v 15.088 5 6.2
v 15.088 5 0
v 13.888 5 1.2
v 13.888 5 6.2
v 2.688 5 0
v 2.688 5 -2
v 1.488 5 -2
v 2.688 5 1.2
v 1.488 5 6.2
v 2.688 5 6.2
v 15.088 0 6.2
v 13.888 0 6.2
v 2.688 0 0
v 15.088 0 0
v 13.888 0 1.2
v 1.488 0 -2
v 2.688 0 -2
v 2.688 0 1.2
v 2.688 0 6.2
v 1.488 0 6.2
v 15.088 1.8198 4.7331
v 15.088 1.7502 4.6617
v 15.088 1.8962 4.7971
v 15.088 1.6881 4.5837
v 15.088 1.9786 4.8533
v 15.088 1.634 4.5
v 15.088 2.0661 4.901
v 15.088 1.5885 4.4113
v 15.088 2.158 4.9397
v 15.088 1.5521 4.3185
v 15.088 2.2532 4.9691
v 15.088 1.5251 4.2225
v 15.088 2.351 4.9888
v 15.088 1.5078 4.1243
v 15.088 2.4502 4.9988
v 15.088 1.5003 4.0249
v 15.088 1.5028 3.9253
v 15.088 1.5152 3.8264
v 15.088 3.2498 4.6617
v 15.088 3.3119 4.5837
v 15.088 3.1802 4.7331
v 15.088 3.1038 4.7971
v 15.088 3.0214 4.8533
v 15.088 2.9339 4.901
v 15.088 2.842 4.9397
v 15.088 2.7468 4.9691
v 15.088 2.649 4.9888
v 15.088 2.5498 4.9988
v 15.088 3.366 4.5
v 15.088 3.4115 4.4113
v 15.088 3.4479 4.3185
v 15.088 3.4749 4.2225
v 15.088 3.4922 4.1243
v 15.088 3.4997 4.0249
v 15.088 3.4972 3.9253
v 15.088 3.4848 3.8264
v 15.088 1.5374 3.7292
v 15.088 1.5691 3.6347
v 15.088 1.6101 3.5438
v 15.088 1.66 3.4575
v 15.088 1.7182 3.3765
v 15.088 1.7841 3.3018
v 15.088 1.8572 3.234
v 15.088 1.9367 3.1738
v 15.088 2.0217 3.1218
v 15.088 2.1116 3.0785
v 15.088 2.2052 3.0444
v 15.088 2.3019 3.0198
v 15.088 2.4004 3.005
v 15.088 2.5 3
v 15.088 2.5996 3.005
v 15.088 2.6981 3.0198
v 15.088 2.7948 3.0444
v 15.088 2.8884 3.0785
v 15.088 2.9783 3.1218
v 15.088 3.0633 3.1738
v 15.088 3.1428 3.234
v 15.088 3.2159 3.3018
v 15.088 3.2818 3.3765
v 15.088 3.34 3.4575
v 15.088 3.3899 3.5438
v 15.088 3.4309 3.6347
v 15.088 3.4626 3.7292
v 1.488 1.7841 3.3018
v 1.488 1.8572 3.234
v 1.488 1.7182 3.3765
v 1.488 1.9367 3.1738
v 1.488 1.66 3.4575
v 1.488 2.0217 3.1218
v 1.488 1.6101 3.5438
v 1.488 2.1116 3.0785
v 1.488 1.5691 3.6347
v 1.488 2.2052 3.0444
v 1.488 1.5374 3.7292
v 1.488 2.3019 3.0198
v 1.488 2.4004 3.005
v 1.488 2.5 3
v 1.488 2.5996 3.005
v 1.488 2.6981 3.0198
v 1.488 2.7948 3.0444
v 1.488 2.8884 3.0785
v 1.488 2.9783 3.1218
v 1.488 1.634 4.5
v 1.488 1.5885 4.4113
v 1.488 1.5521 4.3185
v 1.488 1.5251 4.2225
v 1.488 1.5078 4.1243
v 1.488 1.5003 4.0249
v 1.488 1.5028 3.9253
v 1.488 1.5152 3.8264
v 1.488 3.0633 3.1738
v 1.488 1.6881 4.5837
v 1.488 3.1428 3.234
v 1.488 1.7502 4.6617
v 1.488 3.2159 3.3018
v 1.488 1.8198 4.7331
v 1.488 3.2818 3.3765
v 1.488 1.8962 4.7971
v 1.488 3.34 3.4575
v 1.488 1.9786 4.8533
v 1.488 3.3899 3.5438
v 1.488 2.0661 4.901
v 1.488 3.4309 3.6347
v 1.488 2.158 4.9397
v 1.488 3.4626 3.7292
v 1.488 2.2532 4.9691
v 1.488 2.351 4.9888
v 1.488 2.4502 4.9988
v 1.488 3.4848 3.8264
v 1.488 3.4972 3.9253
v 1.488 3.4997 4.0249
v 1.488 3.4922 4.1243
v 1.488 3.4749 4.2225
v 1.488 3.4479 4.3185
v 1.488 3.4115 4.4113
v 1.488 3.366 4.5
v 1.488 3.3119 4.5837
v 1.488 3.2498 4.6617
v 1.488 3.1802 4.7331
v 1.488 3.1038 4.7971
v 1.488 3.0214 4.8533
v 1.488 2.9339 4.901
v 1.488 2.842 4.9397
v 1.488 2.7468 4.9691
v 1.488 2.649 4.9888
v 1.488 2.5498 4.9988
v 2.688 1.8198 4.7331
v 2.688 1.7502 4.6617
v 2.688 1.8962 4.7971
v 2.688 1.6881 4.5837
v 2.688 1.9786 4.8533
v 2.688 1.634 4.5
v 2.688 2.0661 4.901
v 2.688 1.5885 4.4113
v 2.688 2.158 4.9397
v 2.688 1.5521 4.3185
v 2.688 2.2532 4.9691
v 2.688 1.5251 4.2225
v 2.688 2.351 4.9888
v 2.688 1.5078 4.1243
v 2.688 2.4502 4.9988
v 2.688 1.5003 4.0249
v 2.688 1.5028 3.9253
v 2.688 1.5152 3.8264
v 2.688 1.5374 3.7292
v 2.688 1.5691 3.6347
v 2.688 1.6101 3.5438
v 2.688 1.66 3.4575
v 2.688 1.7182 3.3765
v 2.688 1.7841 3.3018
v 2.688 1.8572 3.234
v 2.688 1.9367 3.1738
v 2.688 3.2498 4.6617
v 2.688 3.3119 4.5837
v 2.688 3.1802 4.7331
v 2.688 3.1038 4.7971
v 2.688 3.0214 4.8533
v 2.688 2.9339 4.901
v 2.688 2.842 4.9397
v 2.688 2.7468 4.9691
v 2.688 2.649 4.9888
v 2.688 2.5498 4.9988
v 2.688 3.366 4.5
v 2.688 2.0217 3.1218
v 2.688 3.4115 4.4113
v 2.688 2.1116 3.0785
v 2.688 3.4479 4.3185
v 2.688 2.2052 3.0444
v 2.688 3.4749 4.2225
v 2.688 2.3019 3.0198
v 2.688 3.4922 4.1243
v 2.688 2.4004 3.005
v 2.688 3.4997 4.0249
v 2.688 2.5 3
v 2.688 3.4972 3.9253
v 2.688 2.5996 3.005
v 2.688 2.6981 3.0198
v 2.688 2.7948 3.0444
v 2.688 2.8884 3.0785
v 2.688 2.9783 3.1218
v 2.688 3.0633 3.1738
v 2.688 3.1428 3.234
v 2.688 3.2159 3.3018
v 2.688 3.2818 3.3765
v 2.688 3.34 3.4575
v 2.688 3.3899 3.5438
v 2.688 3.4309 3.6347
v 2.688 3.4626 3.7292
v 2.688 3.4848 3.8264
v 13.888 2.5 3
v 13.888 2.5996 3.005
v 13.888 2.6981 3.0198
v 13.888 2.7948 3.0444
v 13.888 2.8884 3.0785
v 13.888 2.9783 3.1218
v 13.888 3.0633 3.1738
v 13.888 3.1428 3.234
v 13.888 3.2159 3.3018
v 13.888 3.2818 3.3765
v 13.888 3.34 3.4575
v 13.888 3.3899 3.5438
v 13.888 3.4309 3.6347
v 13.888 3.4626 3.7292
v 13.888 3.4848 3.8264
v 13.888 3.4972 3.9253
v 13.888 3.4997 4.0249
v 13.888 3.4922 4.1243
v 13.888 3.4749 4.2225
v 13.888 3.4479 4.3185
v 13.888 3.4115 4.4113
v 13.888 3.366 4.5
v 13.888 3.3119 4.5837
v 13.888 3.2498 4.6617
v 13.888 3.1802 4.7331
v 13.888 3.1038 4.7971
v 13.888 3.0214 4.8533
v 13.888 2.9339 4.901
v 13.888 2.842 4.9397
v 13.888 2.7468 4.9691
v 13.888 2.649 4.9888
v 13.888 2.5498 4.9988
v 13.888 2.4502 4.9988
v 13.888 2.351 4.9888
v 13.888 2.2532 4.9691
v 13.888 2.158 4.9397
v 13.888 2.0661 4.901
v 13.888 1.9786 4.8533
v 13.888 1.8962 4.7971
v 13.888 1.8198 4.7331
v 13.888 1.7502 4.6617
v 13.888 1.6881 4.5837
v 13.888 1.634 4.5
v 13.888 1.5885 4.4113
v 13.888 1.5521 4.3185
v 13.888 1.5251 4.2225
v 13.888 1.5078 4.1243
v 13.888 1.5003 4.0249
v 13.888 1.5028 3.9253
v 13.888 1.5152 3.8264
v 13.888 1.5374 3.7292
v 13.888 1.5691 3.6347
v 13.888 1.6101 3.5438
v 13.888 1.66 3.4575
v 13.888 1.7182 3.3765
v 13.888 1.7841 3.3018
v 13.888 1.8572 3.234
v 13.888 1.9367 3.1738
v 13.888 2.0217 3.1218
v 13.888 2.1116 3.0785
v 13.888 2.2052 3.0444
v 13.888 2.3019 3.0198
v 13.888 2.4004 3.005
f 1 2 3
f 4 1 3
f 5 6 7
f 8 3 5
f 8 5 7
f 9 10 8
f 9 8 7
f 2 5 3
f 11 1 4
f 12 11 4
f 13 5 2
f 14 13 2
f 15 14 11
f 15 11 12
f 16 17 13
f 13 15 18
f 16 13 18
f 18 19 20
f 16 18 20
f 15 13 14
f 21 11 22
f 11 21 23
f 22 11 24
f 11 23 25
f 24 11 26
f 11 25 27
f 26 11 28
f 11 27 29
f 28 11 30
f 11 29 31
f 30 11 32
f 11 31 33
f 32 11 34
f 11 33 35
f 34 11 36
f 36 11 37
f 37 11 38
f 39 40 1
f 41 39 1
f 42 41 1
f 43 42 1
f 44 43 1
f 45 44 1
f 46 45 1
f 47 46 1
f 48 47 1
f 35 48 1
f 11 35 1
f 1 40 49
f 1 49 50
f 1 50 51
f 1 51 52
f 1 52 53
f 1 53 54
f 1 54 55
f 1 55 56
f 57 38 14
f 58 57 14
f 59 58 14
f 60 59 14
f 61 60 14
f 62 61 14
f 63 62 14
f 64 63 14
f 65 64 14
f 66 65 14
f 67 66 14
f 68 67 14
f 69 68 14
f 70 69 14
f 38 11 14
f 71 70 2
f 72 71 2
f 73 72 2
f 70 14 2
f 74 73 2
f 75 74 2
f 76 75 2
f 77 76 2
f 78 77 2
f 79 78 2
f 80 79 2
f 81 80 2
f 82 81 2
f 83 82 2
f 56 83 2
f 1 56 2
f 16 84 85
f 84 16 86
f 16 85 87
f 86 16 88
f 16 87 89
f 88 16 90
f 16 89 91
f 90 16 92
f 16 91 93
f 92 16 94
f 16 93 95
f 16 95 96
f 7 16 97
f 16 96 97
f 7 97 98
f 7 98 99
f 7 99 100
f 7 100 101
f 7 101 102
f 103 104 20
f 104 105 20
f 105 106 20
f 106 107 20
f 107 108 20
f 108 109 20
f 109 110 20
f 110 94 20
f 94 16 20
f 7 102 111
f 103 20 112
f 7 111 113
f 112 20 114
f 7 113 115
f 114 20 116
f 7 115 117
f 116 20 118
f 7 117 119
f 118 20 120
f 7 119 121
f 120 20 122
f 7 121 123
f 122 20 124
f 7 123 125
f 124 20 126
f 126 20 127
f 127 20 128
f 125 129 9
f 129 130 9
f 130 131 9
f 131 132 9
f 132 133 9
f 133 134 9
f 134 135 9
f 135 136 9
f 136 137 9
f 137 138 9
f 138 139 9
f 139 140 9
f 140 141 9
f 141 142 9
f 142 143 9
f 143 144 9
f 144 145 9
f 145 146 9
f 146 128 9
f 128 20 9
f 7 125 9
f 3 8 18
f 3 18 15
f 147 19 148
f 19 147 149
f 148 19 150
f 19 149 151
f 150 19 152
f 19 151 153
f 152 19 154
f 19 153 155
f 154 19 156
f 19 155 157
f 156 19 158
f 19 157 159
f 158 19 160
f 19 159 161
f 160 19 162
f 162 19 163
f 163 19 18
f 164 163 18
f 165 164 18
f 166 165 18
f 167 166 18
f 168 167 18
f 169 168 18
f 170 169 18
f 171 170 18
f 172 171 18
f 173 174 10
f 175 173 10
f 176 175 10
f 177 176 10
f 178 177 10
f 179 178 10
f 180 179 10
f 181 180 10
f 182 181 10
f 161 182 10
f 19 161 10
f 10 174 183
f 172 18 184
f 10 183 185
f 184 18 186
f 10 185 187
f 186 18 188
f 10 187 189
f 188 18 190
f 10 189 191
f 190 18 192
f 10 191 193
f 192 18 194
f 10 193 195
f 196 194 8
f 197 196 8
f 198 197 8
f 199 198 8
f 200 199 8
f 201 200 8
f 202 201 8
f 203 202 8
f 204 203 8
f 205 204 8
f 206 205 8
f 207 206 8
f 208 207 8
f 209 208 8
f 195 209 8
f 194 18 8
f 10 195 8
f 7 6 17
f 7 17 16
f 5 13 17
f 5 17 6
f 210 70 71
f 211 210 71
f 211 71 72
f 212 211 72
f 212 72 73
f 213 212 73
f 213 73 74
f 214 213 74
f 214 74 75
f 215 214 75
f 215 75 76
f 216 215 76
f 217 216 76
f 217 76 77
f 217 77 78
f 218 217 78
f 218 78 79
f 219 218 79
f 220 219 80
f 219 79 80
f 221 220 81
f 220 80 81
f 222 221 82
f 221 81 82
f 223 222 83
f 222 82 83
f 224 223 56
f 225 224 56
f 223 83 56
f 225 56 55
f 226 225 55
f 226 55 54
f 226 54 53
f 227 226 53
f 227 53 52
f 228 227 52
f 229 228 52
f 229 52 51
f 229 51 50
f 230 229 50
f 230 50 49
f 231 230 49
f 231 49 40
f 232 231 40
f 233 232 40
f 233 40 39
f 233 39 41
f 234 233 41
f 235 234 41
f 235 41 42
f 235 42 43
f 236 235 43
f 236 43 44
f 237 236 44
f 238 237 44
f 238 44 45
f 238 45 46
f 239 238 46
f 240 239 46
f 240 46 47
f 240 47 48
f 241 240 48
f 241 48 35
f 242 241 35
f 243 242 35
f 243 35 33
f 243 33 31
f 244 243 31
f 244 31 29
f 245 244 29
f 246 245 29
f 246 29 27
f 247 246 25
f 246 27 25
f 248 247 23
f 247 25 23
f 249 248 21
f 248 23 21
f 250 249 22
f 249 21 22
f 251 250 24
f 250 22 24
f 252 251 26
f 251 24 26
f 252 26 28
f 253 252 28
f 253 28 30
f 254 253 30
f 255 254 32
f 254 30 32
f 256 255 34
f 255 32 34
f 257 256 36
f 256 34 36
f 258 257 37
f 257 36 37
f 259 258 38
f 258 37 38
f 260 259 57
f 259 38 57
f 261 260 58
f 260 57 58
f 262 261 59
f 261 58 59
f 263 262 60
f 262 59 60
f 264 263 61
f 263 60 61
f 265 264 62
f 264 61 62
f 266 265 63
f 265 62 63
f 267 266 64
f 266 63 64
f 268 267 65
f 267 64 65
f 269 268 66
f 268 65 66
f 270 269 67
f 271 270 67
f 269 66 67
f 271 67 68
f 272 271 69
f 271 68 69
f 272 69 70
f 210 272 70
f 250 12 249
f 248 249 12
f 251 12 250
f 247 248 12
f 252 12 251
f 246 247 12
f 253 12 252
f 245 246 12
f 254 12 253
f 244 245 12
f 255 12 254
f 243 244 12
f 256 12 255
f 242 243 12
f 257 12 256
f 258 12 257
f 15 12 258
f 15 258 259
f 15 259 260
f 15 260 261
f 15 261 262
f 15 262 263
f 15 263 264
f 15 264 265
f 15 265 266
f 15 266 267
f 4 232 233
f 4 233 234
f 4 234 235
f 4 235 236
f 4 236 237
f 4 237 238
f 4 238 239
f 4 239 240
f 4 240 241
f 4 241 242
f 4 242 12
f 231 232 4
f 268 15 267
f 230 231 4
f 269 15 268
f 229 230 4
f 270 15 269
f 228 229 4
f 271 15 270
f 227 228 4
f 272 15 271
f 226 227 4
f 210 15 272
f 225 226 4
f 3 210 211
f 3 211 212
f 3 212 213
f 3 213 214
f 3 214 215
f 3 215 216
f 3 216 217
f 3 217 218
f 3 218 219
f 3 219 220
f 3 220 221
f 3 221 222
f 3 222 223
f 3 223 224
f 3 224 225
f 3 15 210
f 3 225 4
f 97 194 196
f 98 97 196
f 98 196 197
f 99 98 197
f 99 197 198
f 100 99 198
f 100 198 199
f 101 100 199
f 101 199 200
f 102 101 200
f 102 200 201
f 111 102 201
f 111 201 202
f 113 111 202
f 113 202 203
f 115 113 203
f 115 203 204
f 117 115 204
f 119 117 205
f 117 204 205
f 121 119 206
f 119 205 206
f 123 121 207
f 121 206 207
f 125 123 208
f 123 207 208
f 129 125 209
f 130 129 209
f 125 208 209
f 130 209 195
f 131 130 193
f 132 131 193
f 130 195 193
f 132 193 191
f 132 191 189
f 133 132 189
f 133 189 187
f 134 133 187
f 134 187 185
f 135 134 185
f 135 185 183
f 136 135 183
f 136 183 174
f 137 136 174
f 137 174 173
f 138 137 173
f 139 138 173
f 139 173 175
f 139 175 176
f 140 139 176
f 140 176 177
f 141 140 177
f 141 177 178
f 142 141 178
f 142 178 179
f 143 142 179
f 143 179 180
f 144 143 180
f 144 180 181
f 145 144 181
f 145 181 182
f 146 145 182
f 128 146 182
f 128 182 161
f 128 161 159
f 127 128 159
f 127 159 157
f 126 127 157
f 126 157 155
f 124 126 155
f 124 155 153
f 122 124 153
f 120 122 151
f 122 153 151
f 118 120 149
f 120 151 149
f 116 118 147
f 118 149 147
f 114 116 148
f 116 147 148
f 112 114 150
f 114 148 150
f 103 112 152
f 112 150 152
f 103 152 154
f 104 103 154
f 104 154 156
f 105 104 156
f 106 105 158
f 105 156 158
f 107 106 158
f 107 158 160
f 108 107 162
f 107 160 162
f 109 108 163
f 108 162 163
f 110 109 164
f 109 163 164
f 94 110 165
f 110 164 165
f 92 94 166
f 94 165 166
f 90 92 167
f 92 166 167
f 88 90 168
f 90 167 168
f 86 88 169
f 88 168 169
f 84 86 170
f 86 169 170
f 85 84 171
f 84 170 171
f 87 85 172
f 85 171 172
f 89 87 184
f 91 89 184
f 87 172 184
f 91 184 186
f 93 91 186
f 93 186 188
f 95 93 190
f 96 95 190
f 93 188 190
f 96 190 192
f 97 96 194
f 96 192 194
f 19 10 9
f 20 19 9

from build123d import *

# Parameters (mm, degrees)
SKETCH_1_W          = 13.6
SKETCH_1_H          = 5
EXTRUDE_1_DEPTH     = 1.2
SKETCH_2_W          = 1.2
SKETCH_2_H          = 5
EXTRUDE_2_DEPTH     = 5
SKETCH_3_R          = 1
CUT_EXTRUDE_1_DEPTH = 14
SKETCH_5_W          = 1.2
SKETCH_5_H          = 5
EXTRUDE_3_DEPTH     = 2


with BuildPart() as part:
    # 草图1 → 凸台-拉伸1 (new body)
    with BuildSketch(Plane.XY):
        with Locations((8.287992891, 2.5)):
            Rectangle(SKETCH_1_W, SKETCH_1_H)
    extrude(amount=EXTRUDE_1_DEPTH)

    # 草图2 → 凸台-拉伸2 (add)
    with BuildSketch(Plane(origin=(0, 0, 1.2), x_dir=(-1, 0, 0), z_dir=(0, 0, -1))):
        with Locations((-14.487992891, 2.5)):
            Rectangle(SKETCH_2_W, SKETCH_2_H)
        with Locations((-2.087992891, 2.5)):
            Rectangle(SKETCH_2_W, SKETCH_2_H)
    extrude(amount=-EXTRUDE_2_DEPTH)

    # 草图3 → 切除-拉伸1 (cut)
    with BuildSketch(Plane(origin=(15.087992891, 0, 0), x_dir=(0, 0, -1), z_dir=(1, 0, 0))):
        with Locations((-4, 2.5)):
            Circle(SKETCH_3_R)
    extrude(amount=-CUT_EXTRUDE_1_DEPTH, mode=Mode.SUBTRACT)

    # 草图5 → 凸台-拉伸3 (add)
    with BuildSketch(Plane(origin=(0, 0, 0), x_dir=(-1, 0, 0), z_dir=(0, 0, -1))):
        with Locations((-2.087992891, 2.5)):
            Rectangle(SKETCH_5_W, SKETCH_5_H)
    extrude(amount=EXTRUDE_3_DEPTH)


solid = part.part
